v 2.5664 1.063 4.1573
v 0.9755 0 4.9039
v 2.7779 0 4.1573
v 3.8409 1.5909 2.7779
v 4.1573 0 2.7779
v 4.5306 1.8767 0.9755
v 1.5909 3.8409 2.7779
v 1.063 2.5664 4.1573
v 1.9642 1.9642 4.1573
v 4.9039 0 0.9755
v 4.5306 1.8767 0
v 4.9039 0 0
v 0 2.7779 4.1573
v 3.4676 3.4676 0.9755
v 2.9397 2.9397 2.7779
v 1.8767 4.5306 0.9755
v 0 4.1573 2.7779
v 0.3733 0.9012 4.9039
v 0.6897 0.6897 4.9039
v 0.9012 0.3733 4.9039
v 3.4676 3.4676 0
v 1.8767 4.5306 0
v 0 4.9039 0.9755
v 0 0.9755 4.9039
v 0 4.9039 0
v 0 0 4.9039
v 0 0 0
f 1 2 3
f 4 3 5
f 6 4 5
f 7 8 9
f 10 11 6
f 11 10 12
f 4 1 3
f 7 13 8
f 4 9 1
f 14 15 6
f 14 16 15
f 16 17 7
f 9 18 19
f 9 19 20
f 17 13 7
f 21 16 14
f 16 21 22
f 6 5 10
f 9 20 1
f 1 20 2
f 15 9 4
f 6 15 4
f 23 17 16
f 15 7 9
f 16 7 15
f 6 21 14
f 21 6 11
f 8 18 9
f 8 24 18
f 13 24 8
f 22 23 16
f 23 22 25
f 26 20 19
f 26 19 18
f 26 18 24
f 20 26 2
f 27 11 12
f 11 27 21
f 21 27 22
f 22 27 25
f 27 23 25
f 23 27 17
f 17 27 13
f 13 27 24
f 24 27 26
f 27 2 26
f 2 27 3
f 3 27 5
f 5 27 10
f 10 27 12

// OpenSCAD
//Author: Chris Correll
//Date: 10/13/2022
//Description: Lesson 2-4 Combing shapes with intersections


intersection() {
sphere(5);
cube([10, 10, 10]);
}
 
